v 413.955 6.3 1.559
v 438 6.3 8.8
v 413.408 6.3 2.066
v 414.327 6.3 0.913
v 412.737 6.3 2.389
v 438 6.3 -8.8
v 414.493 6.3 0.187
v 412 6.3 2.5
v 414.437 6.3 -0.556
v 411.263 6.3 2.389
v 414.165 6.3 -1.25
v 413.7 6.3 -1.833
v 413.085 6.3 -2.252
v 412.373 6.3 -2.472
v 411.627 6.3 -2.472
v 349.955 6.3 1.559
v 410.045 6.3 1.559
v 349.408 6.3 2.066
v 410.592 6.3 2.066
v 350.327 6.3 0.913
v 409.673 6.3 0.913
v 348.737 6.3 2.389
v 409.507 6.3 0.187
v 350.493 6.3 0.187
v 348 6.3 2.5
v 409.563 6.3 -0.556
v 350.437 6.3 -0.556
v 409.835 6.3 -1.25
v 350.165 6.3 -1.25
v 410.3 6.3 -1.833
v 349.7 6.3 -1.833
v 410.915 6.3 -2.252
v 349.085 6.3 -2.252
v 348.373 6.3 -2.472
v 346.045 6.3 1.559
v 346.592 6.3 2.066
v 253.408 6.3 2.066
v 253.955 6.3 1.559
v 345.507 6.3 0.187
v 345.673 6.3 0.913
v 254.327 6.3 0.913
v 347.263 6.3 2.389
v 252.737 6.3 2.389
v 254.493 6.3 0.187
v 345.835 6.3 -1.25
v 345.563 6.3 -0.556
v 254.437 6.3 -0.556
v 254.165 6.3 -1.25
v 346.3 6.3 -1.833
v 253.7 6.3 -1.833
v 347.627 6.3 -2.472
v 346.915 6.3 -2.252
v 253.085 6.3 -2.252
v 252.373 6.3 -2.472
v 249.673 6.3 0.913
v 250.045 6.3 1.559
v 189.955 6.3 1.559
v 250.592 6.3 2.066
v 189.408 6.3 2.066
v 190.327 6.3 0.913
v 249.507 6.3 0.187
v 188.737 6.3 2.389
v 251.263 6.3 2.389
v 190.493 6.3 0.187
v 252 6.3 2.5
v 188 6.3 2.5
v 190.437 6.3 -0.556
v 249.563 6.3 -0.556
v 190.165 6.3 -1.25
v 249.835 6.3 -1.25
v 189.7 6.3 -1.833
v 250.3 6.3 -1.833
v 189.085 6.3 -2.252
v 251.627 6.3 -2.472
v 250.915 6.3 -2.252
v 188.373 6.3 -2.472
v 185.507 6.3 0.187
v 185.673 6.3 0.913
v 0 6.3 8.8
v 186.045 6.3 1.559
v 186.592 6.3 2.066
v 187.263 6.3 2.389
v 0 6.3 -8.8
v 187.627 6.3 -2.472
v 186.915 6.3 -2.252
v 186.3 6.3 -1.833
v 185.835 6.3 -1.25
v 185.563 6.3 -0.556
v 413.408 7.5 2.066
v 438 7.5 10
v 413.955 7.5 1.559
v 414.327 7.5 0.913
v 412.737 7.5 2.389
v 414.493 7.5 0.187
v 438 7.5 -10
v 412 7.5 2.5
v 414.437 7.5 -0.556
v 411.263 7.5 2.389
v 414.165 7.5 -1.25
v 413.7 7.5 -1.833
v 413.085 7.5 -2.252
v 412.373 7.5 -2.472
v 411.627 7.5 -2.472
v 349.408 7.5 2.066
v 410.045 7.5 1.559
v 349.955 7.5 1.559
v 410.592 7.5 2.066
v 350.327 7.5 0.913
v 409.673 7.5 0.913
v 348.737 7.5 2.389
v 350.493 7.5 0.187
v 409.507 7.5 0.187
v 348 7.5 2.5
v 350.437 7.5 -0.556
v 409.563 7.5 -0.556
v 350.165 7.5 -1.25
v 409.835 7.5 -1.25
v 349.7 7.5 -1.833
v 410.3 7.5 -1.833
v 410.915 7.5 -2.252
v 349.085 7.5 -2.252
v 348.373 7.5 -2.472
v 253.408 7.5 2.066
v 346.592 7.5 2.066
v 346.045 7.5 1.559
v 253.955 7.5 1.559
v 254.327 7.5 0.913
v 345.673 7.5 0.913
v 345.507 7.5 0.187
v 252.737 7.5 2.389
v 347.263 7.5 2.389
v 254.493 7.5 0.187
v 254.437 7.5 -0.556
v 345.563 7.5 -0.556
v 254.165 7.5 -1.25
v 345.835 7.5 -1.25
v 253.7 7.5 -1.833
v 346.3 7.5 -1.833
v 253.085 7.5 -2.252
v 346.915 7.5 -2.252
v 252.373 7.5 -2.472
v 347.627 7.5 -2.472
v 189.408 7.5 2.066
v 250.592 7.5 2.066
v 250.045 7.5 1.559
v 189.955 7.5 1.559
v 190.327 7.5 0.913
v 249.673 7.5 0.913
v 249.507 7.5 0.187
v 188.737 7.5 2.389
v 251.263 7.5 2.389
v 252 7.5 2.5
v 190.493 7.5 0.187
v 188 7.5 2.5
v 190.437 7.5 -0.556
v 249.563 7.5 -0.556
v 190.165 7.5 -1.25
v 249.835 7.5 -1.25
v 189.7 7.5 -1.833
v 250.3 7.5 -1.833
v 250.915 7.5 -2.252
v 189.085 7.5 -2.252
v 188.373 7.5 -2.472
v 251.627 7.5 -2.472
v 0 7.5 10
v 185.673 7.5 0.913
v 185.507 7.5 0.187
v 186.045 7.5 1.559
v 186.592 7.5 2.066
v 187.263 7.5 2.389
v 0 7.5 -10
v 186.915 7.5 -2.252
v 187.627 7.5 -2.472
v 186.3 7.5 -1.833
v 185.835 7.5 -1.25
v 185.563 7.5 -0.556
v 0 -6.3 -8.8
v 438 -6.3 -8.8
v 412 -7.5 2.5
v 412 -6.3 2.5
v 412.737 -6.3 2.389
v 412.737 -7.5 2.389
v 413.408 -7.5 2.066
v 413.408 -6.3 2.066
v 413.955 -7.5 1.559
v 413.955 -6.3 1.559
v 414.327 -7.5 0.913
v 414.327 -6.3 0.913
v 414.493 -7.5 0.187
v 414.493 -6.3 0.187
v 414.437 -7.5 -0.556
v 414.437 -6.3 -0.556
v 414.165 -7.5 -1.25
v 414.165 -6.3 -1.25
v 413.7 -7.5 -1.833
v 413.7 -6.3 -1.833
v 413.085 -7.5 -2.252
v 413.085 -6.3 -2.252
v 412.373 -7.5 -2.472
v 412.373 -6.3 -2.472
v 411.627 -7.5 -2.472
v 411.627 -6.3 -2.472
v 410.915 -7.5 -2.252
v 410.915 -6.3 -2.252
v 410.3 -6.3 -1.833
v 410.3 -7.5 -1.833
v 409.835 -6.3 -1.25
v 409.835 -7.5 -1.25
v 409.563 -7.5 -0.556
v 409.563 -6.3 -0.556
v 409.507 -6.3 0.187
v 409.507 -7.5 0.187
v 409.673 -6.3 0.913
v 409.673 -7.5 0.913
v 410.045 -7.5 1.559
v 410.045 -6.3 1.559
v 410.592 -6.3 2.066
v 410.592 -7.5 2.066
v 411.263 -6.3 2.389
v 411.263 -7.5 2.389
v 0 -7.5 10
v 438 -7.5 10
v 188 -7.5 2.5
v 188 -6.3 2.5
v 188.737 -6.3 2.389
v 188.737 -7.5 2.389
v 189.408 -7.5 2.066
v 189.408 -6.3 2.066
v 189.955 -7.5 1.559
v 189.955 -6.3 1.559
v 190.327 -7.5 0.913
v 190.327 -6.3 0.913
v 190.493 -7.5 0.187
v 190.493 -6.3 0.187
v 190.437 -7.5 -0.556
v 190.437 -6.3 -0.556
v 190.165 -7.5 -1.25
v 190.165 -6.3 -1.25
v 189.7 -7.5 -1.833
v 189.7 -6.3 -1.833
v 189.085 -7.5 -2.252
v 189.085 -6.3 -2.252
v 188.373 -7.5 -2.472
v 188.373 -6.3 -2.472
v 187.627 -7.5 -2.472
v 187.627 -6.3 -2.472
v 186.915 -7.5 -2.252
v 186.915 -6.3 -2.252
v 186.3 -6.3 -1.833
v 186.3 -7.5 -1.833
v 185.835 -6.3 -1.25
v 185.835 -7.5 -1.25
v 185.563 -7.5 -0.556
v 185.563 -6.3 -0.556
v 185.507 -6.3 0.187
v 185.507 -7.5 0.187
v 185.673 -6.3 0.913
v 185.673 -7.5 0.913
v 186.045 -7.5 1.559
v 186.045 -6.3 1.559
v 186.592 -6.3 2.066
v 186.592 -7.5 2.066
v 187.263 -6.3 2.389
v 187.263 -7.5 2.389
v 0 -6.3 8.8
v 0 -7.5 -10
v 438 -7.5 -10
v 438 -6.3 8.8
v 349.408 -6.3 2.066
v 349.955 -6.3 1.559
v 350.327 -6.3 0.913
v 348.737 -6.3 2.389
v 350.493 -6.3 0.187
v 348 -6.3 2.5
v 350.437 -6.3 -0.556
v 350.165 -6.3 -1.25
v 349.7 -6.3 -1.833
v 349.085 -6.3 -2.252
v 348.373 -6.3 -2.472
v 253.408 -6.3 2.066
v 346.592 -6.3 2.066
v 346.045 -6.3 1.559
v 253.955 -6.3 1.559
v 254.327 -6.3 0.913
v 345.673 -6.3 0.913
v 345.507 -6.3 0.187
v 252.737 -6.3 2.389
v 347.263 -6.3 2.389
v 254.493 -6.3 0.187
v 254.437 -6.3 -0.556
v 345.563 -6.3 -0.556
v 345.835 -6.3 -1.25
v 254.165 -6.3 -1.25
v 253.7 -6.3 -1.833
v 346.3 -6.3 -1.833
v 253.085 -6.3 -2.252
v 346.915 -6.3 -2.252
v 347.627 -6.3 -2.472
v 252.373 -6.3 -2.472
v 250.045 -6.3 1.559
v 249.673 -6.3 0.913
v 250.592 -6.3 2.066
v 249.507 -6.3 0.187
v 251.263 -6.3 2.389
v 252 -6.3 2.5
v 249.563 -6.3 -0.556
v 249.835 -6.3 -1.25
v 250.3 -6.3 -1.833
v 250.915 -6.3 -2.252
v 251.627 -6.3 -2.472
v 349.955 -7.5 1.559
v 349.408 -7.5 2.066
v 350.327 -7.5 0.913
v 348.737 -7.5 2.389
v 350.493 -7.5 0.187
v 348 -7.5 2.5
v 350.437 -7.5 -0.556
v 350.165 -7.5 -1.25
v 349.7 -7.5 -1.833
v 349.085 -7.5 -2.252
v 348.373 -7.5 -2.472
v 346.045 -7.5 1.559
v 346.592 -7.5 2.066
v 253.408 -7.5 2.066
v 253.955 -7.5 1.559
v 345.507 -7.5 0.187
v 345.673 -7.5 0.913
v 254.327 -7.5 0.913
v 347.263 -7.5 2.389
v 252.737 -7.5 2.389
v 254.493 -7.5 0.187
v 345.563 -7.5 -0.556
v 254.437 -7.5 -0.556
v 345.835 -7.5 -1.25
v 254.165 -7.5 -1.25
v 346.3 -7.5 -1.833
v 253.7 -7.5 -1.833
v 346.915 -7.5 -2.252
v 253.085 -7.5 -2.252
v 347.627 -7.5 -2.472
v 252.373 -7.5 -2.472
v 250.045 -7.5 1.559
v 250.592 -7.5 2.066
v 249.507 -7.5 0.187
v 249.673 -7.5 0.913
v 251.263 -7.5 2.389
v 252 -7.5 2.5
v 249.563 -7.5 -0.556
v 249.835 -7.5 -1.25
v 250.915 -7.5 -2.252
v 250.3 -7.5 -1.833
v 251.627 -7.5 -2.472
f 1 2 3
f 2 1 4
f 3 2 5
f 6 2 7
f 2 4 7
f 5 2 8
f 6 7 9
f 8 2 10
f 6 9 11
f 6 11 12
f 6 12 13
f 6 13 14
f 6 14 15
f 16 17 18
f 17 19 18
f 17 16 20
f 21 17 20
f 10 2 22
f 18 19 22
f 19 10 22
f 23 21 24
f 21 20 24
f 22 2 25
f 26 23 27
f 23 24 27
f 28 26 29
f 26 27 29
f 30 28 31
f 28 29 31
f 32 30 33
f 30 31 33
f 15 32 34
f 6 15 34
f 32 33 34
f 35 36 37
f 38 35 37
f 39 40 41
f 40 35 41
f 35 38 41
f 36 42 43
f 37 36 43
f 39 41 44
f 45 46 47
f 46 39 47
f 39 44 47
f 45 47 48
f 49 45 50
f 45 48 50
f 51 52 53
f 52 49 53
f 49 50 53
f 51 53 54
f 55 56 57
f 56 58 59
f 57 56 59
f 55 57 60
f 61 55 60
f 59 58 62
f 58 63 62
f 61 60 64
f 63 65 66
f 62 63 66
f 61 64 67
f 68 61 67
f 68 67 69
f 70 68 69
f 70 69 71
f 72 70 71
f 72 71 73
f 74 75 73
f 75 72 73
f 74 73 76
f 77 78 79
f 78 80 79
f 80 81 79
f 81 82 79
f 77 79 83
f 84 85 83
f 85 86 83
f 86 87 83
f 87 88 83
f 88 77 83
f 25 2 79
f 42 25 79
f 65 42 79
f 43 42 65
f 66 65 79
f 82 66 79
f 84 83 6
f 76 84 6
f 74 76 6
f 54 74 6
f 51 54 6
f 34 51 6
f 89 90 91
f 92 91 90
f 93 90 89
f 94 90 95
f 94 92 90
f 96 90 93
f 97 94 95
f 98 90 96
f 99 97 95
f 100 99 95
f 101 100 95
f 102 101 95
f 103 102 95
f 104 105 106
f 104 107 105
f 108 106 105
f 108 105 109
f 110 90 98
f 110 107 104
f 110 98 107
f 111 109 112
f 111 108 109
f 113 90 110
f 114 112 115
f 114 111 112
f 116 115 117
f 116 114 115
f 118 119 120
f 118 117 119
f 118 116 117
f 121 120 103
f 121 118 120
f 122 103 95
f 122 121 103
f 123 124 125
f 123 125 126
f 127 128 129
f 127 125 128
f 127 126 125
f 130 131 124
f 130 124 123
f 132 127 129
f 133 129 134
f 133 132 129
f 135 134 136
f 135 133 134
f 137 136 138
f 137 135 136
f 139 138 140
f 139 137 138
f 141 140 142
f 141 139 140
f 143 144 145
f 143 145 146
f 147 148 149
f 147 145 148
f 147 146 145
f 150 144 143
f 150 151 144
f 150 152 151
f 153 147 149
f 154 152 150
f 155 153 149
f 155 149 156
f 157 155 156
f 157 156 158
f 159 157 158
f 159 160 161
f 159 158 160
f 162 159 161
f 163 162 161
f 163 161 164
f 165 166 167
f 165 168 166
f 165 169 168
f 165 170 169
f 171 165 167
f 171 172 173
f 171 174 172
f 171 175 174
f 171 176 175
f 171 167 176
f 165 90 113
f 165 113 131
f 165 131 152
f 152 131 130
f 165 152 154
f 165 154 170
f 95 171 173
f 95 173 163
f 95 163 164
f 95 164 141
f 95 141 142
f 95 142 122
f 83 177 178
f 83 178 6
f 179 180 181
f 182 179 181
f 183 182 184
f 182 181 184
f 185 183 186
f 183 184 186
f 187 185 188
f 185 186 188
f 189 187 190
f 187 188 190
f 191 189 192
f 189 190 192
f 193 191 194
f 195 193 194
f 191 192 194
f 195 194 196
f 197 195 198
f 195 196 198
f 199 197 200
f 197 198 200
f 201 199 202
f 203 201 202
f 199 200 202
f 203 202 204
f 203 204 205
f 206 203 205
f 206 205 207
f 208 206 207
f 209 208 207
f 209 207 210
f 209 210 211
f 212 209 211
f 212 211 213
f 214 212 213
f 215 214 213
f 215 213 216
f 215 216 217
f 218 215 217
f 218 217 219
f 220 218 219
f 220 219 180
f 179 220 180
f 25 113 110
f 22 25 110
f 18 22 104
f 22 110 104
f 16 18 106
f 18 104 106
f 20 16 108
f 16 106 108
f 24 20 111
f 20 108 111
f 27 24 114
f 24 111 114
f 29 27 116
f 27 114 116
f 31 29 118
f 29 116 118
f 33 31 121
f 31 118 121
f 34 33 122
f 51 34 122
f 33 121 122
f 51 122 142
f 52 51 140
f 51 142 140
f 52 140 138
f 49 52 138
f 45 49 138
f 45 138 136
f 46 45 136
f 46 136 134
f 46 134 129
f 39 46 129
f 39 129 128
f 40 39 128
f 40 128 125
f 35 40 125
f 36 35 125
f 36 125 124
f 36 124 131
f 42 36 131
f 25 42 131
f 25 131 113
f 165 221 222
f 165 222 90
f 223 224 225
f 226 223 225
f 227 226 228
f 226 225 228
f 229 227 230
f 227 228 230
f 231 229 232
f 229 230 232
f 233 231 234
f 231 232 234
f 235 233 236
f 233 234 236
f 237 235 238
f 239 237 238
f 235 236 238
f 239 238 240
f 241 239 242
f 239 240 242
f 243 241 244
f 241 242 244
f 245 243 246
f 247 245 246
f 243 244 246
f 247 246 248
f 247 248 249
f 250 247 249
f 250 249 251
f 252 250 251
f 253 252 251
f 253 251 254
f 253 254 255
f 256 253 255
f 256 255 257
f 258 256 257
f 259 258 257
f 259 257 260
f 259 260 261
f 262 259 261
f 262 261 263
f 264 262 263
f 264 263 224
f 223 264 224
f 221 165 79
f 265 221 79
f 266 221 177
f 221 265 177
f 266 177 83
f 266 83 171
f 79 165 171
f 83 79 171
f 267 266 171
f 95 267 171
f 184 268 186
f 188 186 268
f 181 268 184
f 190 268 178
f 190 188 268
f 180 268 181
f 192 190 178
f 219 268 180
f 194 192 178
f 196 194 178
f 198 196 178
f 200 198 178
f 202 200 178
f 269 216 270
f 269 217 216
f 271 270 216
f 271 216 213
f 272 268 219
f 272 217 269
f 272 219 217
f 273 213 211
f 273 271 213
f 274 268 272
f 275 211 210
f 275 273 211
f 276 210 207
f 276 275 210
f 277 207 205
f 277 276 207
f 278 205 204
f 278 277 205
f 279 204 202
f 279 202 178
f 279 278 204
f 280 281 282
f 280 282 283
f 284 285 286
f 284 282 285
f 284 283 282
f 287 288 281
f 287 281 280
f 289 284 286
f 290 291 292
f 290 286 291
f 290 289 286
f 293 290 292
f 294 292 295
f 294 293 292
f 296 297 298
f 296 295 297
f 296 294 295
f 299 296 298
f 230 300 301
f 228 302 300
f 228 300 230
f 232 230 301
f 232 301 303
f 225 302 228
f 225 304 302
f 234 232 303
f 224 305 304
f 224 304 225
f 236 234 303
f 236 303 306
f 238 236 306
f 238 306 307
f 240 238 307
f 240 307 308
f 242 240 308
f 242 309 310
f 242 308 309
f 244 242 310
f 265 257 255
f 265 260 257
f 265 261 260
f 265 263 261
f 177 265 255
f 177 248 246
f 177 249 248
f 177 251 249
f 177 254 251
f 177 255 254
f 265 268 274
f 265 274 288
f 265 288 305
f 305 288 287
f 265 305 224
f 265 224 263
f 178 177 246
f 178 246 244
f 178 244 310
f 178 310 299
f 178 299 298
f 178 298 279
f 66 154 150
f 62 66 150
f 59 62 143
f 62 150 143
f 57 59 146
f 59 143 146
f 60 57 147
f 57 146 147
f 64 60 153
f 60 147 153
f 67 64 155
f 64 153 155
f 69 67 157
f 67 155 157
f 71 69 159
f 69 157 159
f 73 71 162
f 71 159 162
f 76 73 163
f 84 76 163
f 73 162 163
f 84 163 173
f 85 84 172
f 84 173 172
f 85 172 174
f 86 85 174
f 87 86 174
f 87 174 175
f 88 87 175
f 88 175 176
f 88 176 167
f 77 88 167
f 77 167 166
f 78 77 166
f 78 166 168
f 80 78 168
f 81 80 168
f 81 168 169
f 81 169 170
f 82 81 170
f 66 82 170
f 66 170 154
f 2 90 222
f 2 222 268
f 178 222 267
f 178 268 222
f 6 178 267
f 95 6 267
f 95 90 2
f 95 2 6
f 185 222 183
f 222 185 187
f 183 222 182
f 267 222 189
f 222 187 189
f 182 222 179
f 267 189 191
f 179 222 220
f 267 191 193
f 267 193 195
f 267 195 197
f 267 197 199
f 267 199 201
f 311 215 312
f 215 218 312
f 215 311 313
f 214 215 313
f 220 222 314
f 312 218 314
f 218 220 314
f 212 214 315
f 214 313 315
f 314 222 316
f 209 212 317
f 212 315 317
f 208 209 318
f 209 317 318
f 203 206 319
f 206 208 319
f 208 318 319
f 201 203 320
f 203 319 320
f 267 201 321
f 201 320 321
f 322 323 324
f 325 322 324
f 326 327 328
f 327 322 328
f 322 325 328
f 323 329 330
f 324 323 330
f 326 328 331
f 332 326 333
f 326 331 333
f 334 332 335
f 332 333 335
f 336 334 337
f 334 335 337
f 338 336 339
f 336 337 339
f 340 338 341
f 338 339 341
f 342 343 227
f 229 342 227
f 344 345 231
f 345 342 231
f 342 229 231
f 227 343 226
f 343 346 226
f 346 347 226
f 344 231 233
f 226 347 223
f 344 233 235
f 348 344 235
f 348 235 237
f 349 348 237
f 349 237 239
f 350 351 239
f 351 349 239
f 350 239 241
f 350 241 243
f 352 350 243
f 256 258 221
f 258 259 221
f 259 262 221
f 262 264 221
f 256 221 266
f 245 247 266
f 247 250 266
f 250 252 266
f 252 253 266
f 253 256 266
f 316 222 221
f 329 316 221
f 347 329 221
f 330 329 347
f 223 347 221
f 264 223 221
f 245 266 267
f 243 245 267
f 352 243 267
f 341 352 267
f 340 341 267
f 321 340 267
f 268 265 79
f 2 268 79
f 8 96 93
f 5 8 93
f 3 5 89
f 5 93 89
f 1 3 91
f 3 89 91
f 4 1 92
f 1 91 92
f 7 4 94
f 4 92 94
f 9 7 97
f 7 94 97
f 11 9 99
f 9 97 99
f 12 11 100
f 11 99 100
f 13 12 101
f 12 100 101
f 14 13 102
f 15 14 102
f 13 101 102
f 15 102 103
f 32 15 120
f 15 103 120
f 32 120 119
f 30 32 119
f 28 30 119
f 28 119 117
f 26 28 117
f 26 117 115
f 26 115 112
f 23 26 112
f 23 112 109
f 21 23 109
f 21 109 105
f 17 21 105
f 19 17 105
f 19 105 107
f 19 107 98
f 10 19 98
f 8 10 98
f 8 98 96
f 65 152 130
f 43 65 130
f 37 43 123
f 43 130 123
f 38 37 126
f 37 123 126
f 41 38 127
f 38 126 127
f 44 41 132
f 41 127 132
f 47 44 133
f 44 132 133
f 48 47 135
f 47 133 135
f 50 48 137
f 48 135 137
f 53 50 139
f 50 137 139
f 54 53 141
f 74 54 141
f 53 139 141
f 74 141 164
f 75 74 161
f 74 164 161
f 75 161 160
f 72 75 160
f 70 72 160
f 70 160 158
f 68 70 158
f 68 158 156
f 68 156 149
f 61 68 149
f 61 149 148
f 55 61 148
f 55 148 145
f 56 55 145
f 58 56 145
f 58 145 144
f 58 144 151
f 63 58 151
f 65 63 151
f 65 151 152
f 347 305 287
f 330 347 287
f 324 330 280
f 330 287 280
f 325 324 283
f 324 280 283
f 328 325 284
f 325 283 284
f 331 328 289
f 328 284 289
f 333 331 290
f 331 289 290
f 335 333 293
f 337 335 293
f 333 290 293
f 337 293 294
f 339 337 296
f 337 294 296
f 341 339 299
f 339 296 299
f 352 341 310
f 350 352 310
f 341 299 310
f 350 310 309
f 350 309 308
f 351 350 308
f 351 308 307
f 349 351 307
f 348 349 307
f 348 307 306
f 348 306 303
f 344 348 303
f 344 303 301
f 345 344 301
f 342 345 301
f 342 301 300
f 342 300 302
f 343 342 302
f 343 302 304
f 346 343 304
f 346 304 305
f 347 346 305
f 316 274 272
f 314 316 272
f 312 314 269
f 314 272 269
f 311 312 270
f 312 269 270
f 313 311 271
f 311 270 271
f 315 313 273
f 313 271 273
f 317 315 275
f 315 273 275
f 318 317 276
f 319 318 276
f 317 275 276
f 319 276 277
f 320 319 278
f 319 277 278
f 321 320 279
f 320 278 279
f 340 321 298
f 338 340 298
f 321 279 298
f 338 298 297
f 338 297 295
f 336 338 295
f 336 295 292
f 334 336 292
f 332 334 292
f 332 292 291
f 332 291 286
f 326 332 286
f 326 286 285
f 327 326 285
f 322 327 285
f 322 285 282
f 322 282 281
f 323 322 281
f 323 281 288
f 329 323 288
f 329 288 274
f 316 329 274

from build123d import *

# Parameters (mm, degrees)
SKETCH1_W               = 20
SKETCH1_H               = 15
SKETCH1_W_2             = 17.6
SKETCH1_H_2             = 12.6
F_15_X_20_X_1_2_1_DEPTH = 438
SKETCH_3_R              = 2.5
CUT_EXTRUDE_1_DEPTH     = 439.370847571


with BuildPart() as part:
    # Sketch1 → 方形管 15 X 20 X 1.2(1) (new body)
    with BuildSketch(Plane(origin=(0, 0, 0), x_dir=(0, 0, -1), z_dir=(1, 0, 0))):
        Rectangle(SKETCH1_W, SKETCH1_H)
        Rectangle(SKETCH1_W_2, SKETCH1_H_2, mode=Mode.SUBTRACT)
    extrude(amount=F_15_X_20_X_1_2_1_DEPTH)

    # 草图3 → 切除-拉伸1 (cut, through all)
    with BuildSketch(Plane(origin=(0, 7.5, 0), x_dir=(1, 0, 0), z_dir=(0, 1, 0))):
        with Locations(Location((188, 0, 0), (0, 0, 270))):
            Circle(SKETCH_3_R)
        with Locations(Location((252, 0, 0), (0, 0, 270))):
            Circle(SKETCH_3_R)
        with Locations(Location((348, 0, 0), (0, 0, 270))):
            Circle(SKETCH_3_R)
        with Locations(Location((412, 0, 0), (0, 0, 270))):
            Circle(SKETCH_3_R)
    extrude(amount=-CUT_EXTRUDE_1_DEPTH, mode=Mode.SUBTRACT)


solid = part.part
